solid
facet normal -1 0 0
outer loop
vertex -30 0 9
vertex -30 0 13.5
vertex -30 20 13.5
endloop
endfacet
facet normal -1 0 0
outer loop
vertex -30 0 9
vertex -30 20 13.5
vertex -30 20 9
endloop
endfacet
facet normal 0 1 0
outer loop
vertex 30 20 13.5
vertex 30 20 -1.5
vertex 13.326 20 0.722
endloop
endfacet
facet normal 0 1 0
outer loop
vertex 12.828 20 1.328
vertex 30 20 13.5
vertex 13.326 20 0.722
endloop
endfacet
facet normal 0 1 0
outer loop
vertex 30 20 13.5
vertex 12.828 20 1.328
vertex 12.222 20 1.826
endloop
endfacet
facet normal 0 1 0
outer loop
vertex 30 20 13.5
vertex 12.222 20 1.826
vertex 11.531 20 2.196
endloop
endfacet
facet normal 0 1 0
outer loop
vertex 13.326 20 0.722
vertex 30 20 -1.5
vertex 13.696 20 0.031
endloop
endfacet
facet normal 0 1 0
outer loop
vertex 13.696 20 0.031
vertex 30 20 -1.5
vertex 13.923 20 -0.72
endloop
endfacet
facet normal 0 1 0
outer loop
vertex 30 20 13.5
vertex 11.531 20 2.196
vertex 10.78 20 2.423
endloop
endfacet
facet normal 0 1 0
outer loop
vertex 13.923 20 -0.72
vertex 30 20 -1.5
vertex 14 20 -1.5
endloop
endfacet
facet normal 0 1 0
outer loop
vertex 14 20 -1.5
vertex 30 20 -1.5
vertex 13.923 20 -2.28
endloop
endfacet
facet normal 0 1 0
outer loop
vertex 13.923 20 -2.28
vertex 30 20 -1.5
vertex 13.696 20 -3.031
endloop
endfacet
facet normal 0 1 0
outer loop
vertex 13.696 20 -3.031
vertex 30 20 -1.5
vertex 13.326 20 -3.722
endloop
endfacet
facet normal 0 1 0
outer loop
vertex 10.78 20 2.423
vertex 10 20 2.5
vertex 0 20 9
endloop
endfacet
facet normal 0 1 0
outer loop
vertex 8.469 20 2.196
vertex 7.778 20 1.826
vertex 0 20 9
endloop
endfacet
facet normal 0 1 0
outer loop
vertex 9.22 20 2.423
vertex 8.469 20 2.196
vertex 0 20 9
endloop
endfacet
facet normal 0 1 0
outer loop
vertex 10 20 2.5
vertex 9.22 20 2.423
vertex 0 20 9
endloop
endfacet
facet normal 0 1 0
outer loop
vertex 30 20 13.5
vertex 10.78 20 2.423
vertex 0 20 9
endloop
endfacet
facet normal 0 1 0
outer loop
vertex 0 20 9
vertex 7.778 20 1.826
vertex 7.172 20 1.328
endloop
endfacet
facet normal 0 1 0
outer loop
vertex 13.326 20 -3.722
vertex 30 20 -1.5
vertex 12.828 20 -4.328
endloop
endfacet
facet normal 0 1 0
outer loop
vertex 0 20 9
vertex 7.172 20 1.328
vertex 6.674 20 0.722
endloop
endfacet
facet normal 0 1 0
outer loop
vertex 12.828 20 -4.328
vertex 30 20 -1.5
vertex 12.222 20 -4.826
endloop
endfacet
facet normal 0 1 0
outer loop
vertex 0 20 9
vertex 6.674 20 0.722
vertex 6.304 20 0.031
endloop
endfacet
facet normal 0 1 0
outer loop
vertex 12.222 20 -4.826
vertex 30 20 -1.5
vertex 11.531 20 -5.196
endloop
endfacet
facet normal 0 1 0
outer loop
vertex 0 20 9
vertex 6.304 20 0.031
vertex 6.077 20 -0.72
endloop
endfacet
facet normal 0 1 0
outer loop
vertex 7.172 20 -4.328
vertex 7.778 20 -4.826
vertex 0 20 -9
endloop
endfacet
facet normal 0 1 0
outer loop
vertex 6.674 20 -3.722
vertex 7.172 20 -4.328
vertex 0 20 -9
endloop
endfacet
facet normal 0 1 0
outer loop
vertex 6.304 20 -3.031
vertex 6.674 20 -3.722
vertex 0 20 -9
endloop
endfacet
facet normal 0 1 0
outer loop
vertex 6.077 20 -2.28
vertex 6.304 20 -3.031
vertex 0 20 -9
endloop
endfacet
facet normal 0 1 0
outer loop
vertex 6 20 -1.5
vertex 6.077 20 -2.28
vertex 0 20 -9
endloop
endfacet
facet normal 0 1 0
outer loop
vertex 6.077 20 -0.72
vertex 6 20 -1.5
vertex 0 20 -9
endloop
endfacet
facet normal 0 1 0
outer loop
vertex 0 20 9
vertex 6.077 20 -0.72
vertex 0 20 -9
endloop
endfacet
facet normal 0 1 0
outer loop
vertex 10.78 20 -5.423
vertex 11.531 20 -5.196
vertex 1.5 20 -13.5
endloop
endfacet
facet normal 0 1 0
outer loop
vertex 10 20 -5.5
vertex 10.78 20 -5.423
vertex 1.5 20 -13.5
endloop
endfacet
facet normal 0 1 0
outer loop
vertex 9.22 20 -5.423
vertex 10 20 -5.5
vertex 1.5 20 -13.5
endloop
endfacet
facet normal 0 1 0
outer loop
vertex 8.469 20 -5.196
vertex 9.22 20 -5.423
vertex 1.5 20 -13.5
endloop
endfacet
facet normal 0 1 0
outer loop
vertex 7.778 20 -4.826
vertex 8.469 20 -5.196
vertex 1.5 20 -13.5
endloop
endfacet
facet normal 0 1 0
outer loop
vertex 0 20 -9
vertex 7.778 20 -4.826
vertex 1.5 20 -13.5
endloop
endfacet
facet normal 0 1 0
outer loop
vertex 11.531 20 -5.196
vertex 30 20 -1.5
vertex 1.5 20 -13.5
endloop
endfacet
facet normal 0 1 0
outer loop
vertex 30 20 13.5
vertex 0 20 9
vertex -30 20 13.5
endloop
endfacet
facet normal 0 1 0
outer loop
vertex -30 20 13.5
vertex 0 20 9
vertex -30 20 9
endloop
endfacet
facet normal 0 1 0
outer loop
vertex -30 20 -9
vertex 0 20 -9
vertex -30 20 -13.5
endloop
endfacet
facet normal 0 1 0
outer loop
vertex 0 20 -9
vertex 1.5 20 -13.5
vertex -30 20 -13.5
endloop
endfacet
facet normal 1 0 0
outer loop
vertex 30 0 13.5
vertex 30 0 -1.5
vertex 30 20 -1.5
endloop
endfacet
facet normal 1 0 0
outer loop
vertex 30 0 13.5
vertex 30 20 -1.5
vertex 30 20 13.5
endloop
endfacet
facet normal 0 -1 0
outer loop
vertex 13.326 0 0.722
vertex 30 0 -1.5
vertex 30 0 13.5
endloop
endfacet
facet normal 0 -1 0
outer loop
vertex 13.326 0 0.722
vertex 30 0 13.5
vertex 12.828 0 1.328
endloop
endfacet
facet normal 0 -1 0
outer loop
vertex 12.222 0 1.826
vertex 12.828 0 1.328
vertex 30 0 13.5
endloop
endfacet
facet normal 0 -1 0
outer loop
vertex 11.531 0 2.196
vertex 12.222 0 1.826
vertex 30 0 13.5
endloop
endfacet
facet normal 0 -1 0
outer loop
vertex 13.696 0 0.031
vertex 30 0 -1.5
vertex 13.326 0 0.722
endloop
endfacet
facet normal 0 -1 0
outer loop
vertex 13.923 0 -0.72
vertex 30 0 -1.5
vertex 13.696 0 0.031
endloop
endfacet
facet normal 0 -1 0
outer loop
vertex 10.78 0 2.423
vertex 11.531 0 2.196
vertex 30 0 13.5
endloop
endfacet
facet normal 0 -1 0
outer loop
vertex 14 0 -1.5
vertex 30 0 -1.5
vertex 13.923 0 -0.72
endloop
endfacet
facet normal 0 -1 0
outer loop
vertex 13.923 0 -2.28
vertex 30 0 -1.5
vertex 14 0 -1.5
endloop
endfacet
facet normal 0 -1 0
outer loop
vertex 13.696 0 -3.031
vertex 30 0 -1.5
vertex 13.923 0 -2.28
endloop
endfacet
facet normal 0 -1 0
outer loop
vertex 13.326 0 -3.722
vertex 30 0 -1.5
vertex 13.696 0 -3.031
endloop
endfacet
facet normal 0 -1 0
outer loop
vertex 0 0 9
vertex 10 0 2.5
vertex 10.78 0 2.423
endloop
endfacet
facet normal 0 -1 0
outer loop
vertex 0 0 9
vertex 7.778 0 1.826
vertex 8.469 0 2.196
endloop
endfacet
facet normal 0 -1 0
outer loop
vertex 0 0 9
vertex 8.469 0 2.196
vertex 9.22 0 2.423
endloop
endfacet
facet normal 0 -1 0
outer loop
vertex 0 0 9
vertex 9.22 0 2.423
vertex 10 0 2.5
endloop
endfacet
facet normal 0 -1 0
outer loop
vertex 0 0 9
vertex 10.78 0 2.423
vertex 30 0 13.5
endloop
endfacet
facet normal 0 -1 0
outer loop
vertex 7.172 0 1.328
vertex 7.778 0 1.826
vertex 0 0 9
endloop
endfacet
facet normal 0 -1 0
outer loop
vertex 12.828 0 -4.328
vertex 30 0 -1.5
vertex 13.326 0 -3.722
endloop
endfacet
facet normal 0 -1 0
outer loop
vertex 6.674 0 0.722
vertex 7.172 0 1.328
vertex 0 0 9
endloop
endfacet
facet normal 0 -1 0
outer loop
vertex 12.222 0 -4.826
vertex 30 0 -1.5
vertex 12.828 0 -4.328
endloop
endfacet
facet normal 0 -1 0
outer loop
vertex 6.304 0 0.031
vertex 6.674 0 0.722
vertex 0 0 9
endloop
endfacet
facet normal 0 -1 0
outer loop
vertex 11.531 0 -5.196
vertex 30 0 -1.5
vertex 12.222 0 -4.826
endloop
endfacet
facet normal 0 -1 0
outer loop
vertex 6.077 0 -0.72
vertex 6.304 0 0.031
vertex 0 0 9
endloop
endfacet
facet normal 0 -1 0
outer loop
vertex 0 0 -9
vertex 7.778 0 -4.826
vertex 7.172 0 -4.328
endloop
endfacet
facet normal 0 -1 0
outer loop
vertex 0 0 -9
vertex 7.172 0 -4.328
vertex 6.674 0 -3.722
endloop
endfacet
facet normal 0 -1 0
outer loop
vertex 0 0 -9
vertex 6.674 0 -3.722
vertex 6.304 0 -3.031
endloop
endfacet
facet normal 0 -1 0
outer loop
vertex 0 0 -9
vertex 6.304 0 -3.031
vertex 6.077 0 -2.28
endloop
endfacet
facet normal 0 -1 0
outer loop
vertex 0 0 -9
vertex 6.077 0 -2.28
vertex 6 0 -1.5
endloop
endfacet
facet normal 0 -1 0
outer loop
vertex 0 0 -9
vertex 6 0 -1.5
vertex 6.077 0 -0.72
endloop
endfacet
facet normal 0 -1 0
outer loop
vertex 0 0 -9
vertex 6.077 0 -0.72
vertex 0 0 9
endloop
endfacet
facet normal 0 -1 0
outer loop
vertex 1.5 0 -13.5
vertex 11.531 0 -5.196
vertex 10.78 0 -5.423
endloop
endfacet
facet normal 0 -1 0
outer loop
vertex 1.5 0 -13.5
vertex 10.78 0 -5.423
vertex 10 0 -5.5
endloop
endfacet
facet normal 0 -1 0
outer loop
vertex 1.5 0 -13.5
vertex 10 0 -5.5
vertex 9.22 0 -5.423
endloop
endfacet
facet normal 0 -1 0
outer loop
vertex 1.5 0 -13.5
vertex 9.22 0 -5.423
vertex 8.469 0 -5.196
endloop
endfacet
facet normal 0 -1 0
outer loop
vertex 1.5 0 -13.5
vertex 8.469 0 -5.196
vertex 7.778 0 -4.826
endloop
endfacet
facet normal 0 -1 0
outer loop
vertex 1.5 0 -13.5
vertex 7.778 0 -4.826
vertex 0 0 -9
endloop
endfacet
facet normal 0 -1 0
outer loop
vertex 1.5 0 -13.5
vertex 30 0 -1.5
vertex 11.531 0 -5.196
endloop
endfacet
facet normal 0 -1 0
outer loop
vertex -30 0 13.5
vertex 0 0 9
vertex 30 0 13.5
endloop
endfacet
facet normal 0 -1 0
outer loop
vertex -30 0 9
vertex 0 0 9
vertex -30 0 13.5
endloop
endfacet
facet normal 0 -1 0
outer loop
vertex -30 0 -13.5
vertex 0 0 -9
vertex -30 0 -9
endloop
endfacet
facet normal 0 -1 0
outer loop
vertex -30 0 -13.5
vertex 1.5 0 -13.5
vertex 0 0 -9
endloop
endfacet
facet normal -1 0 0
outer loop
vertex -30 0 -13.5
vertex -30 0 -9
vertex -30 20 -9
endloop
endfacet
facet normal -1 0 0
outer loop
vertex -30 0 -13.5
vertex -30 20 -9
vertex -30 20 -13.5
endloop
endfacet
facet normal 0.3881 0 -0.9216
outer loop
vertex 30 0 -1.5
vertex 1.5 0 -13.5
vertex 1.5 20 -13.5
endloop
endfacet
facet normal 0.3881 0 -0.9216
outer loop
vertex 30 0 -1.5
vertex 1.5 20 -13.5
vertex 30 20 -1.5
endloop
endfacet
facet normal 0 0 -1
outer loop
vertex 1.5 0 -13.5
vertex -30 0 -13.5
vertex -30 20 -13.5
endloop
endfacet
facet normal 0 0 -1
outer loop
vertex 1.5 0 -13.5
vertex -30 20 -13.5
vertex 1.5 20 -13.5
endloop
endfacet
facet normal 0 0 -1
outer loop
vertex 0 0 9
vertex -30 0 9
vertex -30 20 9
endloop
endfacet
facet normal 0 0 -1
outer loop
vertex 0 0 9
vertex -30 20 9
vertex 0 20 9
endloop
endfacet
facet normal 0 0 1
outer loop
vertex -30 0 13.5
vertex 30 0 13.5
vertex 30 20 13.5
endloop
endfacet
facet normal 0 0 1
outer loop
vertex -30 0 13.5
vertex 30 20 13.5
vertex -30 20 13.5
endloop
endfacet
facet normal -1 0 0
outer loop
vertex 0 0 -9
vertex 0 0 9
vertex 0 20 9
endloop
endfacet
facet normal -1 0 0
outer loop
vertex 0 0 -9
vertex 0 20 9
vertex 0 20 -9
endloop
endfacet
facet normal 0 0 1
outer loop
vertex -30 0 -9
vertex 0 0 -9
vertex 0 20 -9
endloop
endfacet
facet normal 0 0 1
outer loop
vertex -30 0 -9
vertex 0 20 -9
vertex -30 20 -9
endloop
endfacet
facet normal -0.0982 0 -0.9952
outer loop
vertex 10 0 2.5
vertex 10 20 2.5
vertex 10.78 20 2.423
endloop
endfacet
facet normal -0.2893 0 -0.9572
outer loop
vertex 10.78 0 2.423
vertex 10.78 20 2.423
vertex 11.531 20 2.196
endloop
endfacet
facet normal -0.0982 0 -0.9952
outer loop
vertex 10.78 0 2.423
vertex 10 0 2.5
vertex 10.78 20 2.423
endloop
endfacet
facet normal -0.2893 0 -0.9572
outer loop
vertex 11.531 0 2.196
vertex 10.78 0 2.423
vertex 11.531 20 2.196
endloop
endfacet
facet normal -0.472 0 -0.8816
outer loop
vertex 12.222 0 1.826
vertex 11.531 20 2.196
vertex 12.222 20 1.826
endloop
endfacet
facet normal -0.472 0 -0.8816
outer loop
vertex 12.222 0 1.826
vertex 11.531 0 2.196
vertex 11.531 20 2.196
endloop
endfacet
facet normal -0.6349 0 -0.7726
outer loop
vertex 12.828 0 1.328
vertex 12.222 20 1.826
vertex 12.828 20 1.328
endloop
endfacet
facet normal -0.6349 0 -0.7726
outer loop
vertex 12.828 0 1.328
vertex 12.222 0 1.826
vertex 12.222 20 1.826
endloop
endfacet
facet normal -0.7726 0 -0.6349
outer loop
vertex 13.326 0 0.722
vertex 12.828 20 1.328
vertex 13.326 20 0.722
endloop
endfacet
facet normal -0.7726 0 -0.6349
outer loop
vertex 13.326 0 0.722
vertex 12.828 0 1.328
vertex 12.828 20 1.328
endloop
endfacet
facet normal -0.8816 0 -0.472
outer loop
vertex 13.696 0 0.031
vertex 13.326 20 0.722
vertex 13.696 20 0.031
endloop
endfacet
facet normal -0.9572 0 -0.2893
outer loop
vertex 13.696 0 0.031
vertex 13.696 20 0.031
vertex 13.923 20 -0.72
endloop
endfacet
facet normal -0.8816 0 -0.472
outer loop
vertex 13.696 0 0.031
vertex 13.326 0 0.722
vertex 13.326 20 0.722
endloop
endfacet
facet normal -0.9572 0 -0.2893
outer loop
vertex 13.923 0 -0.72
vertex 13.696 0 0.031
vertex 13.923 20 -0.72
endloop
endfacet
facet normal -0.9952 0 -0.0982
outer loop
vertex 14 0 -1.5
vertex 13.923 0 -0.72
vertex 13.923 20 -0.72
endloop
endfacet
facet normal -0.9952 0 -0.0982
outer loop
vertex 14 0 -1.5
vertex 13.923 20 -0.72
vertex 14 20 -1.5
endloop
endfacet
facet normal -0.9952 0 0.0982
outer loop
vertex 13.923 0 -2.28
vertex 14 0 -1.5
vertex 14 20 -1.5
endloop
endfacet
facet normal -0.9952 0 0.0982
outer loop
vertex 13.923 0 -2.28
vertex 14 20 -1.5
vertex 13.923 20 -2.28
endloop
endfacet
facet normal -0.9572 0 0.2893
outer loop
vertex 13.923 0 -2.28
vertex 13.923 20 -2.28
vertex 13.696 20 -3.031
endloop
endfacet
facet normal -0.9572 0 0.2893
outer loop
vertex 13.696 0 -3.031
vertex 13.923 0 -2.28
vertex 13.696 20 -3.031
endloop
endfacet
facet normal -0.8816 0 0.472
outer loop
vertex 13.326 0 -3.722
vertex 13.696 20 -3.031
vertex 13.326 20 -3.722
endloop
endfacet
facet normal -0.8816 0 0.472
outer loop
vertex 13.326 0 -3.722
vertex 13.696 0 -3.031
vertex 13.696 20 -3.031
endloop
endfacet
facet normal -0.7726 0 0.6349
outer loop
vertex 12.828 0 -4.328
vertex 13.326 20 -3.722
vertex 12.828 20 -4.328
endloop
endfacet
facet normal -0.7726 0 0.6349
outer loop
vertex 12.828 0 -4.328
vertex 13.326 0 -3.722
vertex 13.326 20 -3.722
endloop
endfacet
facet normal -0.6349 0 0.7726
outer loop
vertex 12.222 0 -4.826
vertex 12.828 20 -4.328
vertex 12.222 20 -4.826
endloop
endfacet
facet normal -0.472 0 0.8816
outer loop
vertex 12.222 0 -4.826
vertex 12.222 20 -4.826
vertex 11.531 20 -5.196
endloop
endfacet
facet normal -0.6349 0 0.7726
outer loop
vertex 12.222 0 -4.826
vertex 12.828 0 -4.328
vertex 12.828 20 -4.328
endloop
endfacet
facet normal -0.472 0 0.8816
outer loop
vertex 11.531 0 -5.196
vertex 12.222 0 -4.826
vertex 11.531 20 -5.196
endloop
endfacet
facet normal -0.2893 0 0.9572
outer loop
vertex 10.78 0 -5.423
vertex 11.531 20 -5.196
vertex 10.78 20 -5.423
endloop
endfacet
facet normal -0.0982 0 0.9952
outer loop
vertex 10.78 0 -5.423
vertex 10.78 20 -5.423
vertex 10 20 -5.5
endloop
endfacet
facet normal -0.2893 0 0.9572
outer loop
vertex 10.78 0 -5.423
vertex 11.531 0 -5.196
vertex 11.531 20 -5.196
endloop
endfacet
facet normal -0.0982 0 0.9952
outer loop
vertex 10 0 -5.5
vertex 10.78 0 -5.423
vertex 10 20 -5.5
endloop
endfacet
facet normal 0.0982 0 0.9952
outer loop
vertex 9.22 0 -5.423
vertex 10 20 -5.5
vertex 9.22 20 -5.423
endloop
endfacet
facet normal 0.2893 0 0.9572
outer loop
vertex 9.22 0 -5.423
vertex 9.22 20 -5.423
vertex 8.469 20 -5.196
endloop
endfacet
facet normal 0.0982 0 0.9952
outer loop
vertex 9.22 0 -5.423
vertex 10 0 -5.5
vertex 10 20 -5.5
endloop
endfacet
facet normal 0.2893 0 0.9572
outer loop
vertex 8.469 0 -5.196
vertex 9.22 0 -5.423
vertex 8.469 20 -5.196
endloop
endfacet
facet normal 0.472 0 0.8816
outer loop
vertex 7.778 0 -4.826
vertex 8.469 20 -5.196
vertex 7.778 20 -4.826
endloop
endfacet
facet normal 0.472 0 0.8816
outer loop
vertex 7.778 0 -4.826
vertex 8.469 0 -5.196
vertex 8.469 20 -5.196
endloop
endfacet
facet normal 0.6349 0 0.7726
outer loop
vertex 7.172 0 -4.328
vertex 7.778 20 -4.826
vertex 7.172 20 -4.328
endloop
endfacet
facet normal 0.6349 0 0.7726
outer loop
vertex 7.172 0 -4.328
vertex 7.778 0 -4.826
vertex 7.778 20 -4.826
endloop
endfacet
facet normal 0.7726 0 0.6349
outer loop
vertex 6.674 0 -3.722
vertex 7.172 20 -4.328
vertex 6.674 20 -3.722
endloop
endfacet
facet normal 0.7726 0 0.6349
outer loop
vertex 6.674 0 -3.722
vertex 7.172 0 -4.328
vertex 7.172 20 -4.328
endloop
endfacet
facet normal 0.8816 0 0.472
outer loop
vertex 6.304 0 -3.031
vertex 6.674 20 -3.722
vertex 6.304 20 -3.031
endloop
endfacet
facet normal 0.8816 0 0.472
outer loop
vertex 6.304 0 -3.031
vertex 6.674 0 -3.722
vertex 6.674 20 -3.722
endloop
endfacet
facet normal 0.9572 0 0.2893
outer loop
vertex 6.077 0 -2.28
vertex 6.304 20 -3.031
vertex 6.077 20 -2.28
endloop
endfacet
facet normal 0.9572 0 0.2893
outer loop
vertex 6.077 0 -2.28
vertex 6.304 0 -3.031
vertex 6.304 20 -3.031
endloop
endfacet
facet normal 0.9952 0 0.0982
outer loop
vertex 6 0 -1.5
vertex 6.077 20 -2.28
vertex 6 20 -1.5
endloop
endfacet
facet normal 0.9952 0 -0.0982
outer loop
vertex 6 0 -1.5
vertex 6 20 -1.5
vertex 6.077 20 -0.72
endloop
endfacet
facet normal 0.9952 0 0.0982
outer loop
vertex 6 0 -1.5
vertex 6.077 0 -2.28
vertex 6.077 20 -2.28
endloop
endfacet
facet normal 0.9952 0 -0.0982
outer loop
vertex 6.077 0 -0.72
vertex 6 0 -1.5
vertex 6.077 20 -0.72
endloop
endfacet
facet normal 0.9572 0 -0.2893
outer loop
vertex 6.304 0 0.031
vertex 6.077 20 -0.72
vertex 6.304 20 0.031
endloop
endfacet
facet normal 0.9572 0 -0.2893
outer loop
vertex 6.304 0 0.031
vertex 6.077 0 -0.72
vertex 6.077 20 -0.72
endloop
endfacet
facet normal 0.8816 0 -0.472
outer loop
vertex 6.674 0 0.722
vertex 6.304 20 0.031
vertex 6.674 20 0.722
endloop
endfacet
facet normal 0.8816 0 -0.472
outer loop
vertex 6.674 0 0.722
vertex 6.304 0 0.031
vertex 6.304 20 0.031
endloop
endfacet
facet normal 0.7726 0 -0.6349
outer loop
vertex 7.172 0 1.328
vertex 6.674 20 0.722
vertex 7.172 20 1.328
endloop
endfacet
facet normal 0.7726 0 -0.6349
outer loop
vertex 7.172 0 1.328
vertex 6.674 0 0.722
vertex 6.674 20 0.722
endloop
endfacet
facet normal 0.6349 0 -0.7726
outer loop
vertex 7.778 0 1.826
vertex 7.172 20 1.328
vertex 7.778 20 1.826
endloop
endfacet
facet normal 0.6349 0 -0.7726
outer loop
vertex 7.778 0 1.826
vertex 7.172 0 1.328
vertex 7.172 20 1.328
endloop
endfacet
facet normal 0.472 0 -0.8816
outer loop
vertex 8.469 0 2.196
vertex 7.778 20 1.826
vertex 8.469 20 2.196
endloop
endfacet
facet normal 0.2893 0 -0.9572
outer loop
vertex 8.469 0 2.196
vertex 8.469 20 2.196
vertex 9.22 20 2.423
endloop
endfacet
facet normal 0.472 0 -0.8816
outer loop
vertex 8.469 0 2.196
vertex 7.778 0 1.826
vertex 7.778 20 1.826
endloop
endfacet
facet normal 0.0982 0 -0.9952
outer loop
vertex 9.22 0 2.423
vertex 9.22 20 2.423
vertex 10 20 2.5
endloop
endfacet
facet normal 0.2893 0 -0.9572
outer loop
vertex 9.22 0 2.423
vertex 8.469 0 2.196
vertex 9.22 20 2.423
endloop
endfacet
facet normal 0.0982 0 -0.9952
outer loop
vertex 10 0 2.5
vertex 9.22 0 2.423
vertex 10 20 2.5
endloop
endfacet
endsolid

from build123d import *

# Parameters (mm, degrees)
SKETCH_1_R      = 4
EXTRUDE_1_DEPTH = 20


with BuildPart() as part:
    # 草图1 → 凸台-拉伸1 (new body)
    with BuildSketch(Plane(origin=(0, 0, 0), x_dir=(1, 0, 0), z_dir=(0, 1, 0))):
        Polygon((-30, 13.5), (1.5, 13.5), (30, 1.5), (30, -13.5), (-30, -13.5), (-30, -9), (0, -9), (0, 9), (-30, 9), align=None)
        with Locations(Location((10, 1.5, 0), (0, 0, 270))):
            Circle(SKETCH_1_R, mode=Mode.SUBTRACT)
    extrude(amount=EXTRUDE_1_DEPTH)


solid = part.part
